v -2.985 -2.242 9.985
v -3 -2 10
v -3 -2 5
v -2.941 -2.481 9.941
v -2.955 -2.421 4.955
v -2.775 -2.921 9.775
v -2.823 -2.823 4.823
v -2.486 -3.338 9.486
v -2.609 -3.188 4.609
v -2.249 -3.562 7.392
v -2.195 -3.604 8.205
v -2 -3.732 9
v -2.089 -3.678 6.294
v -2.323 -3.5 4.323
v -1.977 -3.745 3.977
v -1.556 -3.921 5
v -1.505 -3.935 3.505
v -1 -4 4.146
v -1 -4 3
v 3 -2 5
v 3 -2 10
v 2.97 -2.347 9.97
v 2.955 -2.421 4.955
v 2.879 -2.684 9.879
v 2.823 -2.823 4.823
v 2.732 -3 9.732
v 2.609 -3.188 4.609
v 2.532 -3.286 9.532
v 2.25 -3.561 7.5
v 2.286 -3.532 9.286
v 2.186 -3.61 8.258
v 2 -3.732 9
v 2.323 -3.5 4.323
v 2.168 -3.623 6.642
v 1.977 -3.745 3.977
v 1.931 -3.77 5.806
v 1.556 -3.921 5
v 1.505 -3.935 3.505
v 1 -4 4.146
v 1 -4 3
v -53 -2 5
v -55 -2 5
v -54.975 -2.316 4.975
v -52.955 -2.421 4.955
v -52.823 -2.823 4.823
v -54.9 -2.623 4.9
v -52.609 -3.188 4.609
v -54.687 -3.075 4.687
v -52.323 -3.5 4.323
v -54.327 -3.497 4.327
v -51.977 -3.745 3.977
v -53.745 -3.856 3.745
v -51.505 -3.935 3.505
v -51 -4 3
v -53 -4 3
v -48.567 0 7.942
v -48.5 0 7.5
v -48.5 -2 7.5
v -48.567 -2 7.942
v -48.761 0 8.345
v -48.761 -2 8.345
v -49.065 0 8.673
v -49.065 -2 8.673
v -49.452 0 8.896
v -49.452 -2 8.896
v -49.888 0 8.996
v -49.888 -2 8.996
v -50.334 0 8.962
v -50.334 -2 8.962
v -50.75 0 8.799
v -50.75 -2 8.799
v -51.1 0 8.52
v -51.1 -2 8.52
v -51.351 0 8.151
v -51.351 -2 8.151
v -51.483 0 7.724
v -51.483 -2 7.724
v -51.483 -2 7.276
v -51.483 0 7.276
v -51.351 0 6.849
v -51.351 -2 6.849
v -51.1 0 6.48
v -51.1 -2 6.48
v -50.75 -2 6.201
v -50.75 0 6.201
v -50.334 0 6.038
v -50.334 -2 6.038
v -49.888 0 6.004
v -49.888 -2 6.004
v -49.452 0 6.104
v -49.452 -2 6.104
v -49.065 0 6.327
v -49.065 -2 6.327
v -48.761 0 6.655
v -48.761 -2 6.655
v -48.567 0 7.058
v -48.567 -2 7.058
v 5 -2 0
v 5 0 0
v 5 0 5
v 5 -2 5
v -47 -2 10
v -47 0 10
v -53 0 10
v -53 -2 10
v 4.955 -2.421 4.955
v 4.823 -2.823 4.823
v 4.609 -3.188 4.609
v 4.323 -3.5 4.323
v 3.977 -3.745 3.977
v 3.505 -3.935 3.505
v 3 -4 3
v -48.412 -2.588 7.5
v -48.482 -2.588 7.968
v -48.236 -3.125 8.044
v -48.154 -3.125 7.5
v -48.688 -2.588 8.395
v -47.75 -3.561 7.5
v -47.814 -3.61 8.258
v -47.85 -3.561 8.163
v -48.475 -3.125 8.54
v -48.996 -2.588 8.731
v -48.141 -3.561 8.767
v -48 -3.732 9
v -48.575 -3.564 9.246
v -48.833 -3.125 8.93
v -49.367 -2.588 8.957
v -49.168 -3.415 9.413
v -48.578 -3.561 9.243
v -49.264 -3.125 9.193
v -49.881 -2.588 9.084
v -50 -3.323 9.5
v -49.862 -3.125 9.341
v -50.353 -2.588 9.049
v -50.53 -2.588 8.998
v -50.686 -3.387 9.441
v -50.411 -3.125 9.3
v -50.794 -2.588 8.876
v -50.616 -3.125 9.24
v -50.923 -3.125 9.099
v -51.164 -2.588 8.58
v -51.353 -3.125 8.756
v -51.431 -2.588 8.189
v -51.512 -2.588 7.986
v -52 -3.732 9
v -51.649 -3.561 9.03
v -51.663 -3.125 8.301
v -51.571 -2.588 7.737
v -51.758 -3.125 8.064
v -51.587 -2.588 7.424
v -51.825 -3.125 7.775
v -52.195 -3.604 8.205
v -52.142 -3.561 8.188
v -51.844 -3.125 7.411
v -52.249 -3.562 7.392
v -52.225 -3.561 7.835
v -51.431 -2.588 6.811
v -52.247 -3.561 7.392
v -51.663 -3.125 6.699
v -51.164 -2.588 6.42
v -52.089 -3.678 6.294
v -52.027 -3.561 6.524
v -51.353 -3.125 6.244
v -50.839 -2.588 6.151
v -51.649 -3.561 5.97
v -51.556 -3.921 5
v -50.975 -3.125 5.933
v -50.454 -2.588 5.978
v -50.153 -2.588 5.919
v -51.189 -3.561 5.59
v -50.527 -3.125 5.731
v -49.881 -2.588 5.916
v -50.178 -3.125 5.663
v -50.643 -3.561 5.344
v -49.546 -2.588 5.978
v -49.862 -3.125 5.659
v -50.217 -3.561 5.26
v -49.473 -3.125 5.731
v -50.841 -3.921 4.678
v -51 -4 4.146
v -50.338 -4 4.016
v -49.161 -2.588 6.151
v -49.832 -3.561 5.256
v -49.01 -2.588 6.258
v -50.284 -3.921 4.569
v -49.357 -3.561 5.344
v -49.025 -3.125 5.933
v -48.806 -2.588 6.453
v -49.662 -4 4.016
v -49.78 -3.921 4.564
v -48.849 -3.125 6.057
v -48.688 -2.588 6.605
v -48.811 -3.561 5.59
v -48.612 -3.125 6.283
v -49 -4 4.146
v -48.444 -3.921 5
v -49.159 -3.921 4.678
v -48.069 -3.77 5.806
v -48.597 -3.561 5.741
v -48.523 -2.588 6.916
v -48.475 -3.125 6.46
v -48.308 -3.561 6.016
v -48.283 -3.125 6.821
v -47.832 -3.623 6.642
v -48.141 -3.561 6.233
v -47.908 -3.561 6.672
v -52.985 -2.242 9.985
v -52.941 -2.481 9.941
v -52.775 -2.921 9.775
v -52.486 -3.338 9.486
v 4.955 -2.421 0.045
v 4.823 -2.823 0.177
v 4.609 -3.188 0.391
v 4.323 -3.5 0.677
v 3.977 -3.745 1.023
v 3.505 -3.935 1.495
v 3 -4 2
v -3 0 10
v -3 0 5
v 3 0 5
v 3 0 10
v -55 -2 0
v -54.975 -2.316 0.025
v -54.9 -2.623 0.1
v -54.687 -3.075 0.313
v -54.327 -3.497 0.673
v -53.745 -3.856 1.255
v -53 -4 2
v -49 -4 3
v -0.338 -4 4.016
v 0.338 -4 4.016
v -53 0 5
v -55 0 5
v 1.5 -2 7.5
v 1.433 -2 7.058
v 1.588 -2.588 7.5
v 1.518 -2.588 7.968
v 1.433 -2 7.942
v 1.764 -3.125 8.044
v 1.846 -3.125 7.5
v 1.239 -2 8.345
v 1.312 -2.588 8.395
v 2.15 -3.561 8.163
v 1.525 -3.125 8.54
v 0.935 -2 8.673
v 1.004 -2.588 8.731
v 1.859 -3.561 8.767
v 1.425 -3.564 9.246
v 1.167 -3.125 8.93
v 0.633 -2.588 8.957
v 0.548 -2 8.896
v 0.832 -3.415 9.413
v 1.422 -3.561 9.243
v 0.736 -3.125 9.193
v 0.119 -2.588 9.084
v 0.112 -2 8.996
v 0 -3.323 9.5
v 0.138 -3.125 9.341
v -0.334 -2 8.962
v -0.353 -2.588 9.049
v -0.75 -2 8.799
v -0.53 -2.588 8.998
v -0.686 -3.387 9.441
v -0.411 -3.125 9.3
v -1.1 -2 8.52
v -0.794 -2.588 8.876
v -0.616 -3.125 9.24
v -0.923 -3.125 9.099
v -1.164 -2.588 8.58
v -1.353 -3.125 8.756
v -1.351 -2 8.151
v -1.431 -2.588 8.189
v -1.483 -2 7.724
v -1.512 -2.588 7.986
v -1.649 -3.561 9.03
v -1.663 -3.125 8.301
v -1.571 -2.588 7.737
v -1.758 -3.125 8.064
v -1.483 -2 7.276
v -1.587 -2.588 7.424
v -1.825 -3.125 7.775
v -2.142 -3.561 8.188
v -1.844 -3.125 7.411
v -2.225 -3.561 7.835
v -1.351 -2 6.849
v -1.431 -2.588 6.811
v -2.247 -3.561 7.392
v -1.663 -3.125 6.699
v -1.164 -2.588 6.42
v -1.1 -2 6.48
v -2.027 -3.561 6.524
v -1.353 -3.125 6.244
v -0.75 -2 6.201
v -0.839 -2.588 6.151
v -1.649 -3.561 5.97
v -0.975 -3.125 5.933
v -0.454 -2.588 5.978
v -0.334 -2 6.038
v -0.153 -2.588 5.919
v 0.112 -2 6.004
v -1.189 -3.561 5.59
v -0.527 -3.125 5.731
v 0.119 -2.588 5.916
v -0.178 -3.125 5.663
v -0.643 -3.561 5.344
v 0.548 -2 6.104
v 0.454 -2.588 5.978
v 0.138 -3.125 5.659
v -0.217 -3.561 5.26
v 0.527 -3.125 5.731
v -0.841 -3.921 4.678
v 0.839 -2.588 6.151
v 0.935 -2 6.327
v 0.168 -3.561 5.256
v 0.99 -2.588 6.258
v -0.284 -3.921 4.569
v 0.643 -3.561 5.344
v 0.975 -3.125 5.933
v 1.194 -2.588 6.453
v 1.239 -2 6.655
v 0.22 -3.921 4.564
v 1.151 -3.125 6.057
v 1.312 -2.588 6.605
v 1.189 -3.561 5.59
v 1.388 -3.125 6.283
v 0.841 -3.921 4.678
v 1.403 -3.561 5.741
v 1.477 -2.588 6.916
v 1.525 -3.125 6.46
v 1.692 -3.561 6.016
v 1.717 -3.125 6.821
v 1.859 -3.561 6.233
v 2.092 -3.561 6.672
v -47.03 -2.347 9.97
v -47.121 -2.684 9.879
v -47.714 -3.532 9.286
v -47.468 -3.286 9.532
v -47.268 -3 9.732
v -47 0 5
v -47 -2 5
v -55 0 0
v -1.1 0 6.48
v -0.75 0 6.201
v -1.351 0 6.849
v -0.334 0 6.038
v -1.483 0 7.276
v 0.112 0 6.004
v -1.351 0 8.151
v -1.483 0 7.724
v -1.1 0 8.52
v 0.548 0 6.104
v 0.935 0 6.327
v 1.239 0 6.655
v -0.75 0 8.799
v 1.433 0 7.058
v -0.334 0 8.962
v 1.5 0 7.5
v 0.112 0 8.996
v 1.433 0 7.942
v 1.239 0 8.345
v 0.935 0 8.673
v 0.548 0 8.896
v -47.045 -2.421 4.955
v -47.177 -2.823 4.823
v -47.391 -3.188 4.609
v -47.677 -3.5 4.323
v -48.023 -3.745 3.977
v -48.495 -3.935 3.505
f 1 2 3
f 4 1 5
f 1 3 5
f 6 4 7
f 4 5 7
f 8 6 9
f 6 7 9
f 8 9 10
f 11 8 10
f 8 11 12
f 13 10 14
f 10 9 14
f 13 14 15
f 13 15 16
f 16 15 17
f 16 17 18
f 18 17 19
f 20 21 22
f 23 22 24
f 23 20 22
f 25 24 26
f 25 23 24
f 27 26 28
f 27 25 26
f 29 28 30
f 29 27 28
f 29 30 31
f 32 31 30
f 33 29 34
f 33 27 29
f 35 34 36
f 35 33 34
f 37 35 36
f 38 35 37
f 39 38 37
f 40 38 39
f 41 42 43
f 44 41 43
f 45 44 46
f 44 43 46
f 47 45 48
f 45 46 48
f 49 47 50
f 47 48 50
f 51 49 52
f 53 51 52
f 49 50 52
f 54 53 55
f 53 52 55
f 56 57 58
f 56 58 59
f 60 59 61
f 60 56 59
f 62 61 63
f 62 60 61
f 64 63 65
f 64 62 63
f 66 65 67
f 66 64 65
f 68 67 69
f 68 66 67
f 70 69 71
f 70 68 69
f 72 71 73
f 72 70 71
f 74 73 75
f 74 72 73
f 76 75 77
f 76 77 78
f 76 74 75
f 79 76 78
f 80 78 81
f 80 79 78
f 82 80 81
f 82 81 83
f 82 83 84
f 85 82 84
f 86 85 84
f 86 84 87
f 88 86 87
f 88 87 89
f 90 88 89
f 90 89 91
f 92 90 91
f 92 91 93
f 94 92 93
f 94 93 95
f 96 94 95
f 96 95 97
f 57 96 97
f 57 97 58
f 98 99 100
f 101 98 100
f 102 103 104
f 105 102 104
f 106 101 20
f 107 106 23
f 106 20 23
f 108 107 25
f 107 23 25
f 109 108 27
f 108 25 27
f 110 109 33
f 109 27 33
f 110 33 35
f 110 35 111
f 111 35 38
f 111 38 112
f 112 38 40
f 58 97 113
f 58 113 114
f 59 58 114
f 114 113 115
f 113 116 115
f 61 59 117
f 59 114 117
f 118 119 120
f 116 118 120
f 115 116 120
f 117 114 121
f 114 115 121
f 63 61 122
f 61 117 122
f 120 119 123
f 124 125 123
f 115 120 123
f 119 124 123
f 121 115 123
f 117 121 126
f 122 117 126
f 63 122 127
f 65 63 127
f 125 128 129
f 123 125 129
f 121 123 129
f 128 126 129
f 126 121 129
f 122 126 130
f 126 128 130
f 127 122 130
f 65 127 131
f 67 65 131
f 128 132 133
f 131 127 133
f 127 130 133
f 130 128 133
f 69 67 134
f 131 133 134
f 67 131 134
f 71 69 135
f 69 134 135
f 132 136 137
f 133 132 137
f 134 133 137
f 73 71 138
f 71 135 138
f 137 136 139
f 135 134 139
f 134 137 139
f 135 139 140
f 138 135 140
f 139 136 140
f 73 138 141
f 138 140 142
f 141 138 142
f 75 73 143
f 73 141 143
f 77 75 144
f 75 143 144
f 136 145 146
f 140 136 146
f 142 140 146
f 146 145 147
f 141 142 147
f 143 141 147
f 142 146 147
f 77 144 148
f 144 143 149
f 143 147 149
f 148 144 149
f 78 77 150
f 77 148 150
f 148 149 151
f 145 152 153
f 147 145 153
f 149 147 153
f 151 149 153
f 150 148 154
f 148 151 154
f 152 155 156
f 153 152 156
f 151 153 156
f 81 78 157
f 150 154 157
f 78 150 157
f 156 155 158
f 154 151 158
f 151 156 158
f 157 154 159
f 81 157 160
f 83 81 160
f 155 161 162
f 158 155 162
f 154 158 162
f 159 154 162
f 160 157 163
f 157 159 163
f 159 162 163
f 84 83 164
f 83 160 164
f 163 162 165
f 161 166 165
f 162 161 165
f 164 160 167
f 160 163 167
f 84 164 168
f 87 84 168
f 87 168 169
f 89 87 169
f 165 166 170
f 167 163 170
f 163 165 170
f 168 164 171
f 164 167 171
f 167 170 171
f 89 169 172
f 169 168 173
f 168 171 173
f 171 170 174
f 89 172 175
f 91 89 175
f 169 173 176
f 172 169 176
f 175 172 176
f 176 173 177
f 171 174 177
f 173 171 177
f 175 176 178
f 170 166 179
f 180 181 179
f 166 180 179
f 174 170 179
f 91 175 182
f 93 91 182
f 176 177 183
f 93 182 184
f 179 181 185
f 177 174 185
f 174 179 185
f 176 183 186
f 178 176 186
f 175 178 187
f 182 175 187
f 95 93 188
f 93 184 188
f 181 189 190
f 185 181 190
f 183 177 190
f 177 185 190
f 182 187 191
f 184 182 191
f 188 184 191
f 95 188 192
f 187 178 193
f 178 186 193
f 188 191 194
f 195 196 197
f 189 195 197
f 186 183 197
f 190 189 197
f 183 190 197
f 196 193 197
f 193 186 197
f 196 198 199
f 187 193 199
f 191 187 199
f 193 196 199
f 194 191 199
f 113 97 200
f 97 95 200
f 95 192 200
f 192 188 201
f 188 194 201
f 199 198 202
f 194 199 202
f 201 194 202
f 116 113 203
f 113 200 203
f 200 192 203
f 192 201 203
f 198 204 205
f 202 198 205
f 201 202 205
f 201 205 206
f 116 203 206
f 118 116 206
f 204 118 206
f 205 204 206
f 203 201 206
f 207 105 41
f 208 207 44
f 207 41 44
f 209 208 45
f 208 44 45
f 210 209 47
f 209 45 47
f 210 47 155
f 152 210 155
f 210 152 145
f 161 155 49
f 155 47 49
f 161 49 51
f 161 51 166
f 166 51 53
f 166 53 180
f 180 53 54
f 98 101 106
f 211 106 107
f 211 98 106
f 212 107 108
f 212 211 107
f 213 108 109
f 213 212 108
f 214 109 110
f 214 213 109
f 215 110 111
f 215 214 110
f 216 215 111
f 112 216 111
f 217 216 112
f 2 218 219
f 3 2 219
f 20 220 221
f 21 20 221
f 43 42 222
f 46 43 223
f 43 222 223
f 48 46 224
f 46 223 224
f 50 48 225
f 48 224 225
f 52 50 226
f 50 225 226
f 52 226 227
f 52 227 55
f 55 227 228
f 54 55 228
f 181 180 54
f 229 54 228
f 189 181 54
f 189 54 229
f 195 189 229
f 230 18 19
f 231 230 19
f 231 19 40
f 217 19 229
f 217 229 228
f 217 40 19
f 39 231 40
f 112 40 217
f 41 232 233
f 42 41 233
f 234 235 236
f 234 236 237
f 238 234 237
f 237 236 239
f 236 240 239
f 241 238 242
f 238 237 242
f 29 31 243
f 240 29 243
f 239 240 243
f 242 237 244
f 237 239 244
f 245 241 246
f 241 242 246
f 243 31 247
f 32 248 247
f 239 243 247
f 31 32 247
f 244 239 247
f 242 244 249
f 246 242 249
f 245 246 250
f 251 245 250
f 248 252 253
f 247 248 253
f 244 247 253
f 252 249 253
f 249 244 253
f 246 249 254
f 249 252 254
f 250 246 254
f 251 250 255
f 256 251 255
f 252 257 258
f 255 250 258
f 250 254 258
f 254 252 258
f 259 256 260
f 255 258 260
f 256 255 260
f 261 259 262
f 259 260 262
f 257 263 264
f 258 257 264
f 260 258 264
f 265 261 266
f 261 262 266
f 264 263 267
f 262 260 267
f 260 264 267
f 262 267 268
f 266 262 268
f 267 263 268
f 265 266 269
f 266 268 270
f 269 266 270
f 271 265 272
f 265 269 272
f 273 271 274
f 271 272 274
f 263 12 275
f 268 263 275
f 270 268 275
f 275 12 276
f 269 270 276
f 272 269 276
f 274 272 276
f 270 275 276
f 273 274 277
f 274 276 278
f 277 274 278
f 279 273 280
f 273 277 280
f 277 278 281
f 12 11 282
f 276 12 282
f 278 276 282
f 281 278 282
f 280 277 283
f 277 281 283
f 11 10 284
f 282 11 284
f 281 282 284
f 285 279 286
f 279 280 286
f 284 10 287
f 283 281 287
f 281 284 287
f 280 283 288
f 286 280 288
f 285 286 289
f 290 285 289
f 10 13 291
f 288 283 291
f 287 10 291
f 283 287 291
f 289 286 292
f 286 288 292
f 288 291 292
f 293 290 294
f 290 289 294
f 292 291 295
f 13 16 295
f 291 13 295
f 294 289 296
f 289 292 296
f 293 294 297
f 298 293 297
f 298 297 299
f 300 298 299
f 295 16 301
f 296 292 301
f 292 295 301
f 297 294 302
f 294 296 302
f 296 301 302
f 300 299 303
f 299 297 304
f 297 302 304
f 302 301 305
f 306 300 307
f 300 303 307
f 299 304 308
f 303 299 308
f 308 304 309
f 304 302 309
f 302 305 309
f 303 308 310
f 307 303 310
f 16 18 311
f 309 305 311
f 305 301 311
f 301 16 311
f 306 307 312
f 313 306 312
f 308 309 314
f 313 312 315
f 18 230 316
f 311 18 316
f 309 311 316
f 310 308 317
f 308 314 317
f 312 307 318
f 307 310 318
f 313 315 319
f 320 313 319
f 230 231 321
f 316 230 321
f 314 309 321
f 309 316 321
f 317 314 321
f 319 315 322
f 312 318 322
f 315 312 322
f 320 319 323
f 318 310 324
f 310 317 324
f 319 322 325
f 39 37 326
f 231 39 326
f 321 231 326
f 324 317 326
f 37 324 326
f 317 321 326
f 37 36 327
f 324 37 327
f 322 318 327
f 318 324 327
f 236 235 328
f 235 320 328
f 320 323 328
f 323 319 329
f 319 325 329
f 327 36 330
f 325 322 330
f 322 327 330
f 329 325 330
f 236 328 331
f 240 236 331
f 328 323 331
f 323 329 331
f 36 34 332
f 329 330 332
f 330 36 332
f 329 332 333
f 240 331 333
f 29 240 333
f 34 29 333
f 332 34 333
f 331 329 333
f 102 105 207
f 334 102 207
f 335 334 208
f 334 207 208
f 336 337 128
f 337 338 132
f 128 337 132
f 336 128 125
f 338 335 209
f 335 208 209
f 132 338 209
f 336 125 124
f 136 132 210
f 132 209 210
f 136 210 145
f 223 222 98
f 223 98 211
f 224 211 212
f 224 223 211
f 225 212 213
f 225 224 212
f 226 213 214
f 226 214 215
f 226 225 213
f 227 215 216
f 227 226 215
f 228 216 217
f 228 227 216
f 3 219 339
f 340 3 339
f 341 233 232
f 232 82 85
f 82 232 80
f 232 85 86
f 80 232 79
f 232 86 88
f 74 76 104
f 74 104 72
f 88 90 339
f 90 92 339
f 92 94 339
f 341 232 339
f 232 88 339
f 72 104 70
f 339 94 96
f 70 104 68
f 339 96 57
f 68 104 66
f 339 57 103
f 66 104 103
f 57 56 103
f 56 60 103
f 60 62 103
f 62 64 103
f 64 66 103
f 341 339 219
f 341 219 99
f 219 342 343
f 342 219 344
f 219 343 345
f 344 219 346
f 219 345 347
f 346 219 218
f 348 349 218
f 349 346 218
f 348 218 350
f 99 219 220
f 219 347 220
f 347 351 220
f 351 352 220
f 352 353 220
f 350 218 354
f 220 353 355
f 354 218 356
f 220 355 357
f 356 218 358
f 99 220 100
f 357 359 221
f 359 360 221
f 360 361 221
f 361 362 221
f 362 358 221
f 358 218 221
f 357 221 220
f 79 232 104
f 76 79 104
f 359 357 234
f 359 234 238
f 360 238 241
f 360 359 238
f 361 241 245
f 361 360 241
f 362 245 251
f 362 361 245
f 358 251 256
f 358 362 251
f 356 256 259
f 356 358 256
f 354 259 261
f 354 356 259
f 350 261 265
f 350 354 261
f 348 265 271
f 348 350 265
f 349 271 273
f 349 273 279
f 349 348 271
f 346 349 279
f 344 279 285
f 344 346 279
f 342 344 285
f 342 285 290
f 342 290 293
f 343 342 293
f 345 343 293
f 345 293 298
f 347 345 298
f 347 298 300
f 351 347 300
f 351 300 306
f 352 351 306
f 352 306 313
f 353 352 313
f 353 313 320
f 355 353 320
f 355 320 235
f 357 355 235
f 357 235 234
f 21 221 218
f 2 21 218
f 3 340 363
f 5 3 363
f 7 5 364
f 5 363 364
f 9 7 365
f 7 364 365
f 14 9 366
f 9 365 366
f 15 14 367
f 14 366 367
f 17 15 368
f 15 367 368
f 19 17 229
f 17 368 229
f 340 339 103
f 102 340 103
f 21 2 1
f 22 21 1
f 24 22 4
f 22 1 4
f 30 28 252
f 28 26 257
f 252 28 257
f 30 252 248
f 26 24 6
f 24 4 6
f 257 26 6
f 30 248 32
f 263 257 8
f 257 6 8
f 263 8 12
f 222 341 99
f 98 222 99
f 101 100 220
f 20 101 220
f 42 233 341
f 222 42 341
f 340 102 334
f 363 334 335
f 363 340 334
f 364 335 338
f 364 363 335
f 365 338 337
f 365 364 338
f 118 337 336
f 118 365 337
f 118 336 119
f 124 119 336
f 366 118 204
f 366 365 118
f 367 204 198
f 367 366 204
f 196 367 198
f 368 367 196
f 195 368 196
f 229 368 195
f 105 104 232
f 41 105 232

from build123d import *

# Parameters (mm, degrees)
F0_R         = 1.5
F1_DEPTH     = 4
F2_T1_DEPTH  = 15
F2_T3_DEPTH  = 70
F2_T5_DEPTH  = 7
F2_T7_DEPTH  = 10
F2_T9_DEPTH  = 16
F2_T11_DEPTH = 44
F2_T13_DEPTH = 16
F2_T15_DEPTH = 7
F2_T25_DEPTH = 12
F2_T29_DEPTH = 15
F2_T36_DEPTH = 15
F2_T40_DEPTH = 49
F2_T47_DEPTH = 49
F2_T51_DEPTH = 15
F2_T58_DEPTH = 15
F2_T62_DEPTH = 12


# Not quite as in the source:
# - a fillet or chamfer that OpenCascade refuses, or shapes differently, is made with other operations: its cross-section is extruded or revolved along the edge and cut away or added


with BuildPart() as f1:
    # F0 (on Front) → F1 (new body)
    with BuildSketch(Plane.XZ):
        Polygon((-55, 5), (-55, 0), (5, 0), (5, 5), (3, 5), (3, 10), (-3, 10), (-3, 5), (-47, 5), (-47, 10), (-53, 10), (-53, 5), align=None)
        with Locations((-50, 7.5)):
            Circle(F0_R, mode=Mode.SUBTRACT)
        with Locations((0, 7.5)):
            Circle(F0_R, mode=Mode.SUBTRACT)
    extrude(amount=F1_DEPTH)

    # F2: fillet of radius 2 on 14 edges, made by hand

    # F2_s2 → F2_t1 (cut)
    with BuildSketch(Plane.XY.offset(-5)):
        with BuildLine():
            ThreePointArc((-55, -2), (-54.4142135624, -3.4142135624), (-53, -4))
            Line((-53, -4), (-55, -4))
            Line((-55, -4), (-55, -2))
        make_face()
        with BuildLine():
            ThreePointArc((5, -2), (4.4142135624, -3.4142135624), (3, -4))
            Line((3, -4), (5, -4))
            Line((5, -4), (5, -2))
        make_face()
    extrude(amount=F2_T1_DEPTH, mode=Mode.SUBTRACT)

    # F2_s4 → F2_t3 (cut)
    with BuildSketch(Plane.YZ.offset(-60)):
        with BuildLine():
            ThreePointArc((-2, 0), (-3.4142135624, 0.5857864376), (-4, 2))
            Line((-4, 2), (-4, 0))
            Line((-4, 0), (-2, 0))
        make_face()
    extrude(amount=F2_T3_DEPTH, mode=Mode.SUBTRACT)

    # F2_s6 → F2_t5 (cut)
    with BuildSketch(Plane.YZ.offset(3)):
        with BuildLine():
            ThreePointArc((-2, 5), (-3.4142135624, 4.4142135624), (-4, 3))
            Line((-4, 3), (-4, 5))
            Line((-4, 5), (-2, 5))
        make_face()
    extrude(amount=F2_T5_DEPTH, mode=Mode.SUBTRACT)

    # F2_s8 → F2_t7 (cut)
    with BuildSketch(Plane.XY.offset(5)):
        with BuildLine():
            ThreePointArc((3, -2), (2.4142135624, -3.4142135624), (1, -4))
            Line((1, -4), (3, -4))
            Line((3, -4), (3, -2))
        make_face()
        with BuildLine():
            ThreePointArc((-3, -2), (-2.4142135624, -3.4142135624), (-1, -4))
            Line((-1, -4), (-3, -4))
            Line((-3, -4), (-3, -2))
        make_face()
        with BuildLine():
            ThreePointArc((-47, -2), (-47.5857864376, -3.4142135624), (-49, -4))
            Line((-49, -4), (-47, -4))
            Line((-47, -4), (-47, -2))
        make_face()
        with BuildLine():
            ThreePointArc((-53, -2), (-52.4142135624, -3.4142135624), (-51, -4))
            Line((-51, -4), (-53, -4))
            Line((-53, -4), (-53, -2))
        make_face()
    extrude(amount=F2_T7_DEPTH, mode=Mode.SUBTRACT)

    # F2_s10 → F2_t9 (cut)
    with BuildSketch(Plane.YZ.offset(-8)):
        with BuildLine():
            ThreePointArc((-2, 10), (-3.4142135624, 9.4142135624), (-4, 8))
            Line((-4, 8), (-4, 10))
            Line((-4, 10), (-2, 10))
        make_face()
    extrude(amount=F2_T9_DEPTH, mode=Mode.SUBTRACT)

    # F2_s12 → F2_t11 (cut)
    with BuildSketch(Plane.YZ.offset(-47)):
        with BuildLine():
            ThreePointArc((-2, 5), (-3.4142135624, 4.4142135624), (-4, 3))
            Line((-4, 3), (-4, 5))
            Line((-4, 5), (-2, 5))
        make_face()
    extrude(amount=F2_T11_DEPTH, mode=Mode.SUBTRACT)

    # F2_s14 → F2_t13 (cut)
    with BuildSketch(Plane.YZ.offset(-58)):
        with BuildLine():
            ThreePointArc((-2, 10), (-3.4142135624, 9.4142135624), (-4, 8))
            Line((-4, 8), (-4, 10))
            Line((-4, 10), (-2, 10))
        make_face()
    extrude(amount=F2_T13_DEPTH, mode=Mode.SUBTRACT)

    # F2_s16 → F2_t15 (cut)
    with BuildSketch(Plane.YZ.offset(-60)):
        with BuildLine():
            ThreePointArc((-2, 5), (-3.4142135624, 4.4142135624), (-4, 3))
            Line((-4, 3), (-4, 5))
            Line((-4, 5), (-2, 5))
        make_face()
    extrude(amount=F2_T15_DEPTH, mode=Mode.SUBTRACT)

    # F2_s17 → F2_t18 (revolve, cut)
    with BuildSketch(Plane.XY.offset(7.5)):
        with BuildLine():
            ThreePointArc((-48.5, -2), (-47.9142135624, -3.4142135624), (-46.5, -4))
            Line((-46.5, -4), (-48.5, -4))
            Line((-48.5, -4), (-48.5, -2))
        make_face()
    revolve(axis=Axis((-50, -4, 7.5), (0, -1, 0)), mode=Mode.SUBTRACT)

    # F2_s19 → F2_t20 (revolve, cut)
    with BuildSketch(Plane.XY.offset(7.5)):
        with BuildLine():
            ThreePointArc((1.5, -2), (2.0857864376, -3.4142135624), (3.5, -4))
            Line((3.5, -4), (1.5, -4))
            Line((1.5, -4), (1.5, -2))
        make_face()
    revolve(axis=Axis((0, -4, 7.5), (0, -1, 0)), mode=Mode.SUBTRACT)


with BuildPart() as f2_tool23:
    # F2_s24 → F2_t25 (new body)
    with BuildSketch(Plane.YZ.offset(10)):
        with BuildLine():
            ThreePointArc((-2, 5), (-3.4142135624, 4.4142135624), (-4, 3))
            Line((-4, 3), (-4, 5))
            Line((-4, 5), (-2, 5))
        make_face()
    extrude(amount=-F2_T25_DEPTH)

    split(bisect_by=Plane.YZ.offset(3), keep=Keep.BOTTOM)


with BuildPart() as f2_tool27:
    # F2_s28 → F2_t29 (new body)
    with BuildSketch(Plane.XY):
        with BuildLine():
            ThreePointArc((3, -2), (2.4142135624, -3.4142135624), (1, -4))
            Line((1, -4), (3, -4))
            Line((3, -4), (3, -2))
        make_face()
    extrude(amount=F2_T29_DEPTH)

    split(bisect_by=Plane.XY.offset(5), keep=Keep.BOTTOM)


with BuildPart() as f2_tool23_1:
    add(f2_tool23.part)

    # F2_t31: intersect F2_tool27
    add(f2_tool27.part, mode=Mode.INTERSECT)


with BuildPart() as f1_1:
    add(f1.part)

    # F2_t21: cut F2_tool23
    add(f2_tool23_1.part, mode=Mode.SUBTRACT)


with BuildPart() as f2_tool34:
    # F2_s35 → F2_t36 (new body)
    with BuildSketch(Plane.XY.offset(15)):
        with BuildLine():
            ThreePointArc((-3, -2), (-2.4142135624, -3.4142135624), (-1, -4))
            Line((-1, -4), (-3, -4))
            Line((-3, -4), (-3, -2))
        make_face()
    extrude(amount=-F2_T36_DEPTH)

    split(bisect_by=Plane.XY.offset(5), keep=Keep.BOTTOM)


with BuildPart() as f2_tool38:
    # F2_s39 → F2_t40 (new body)
    with BuildSketch(Plane.YZ.offset(2)):
        with BuildLine():
            ThreePointArc((-2, 5), (-3.4142135624, 4.4142135624), (-4, 3))
            Line((-4, 3), (-4, 5))
            Line((-4, 5), (-2, 5))
        make_face()
    extrude(amount=-F2_T40_DEPTH)

    split(bisect_by=Plane.YZ.offset(-3), keep=Keep.TOP)


with BuildPart() as f2_tool34_1:
    add(f2_tool34.part)

    # F2_t42: intersect F2_tool38
    add(f2_tool38.part, mode=Mode.INTERSECT)


with BuildPart() as f1_2:
    add(f1_1.part)

    # F2_t32: cut F2_tool34
    add(f2_tool34_1.part, mode=Mode.SUBTRACT)


with BuildPart() as f2_tool45:
    # F2_s46 → F2_t47 (new body)
    with BuildSketch(Plane.YZ.offset(-3)):
        with BuildLine():
            ThreePointArc((-2, 5), (-3.4142135624, 4.4142135624), (-4, 3))
            Line((-4, 3), (-4, 5))
            Line((-4, 5), (-2, 5))
        make_face()
    extrude(amount=-F2_T47_DEPTH)

    split(bisect_by=Plane.YZ.offset(-47), keep=Keep.BOTTOM)


with BuildPart() as f2_tool49:
    # F2_s50 → F2_t51 (new body)
    with BuildSketch(Plane.XY):
        with BuildLine():
            ThreePointArc((-47, -2), (-47.5857864376, -3.4142135624), (-49, -4))
            Line((-49, -4), (-47, -4))
            Line((-47, -4), (-47, -2))
        make_face()
    extrude(amount=F2_T51_DEPTH)

    split(bisect_by=Plane.XY.offset(5), keep=Keep.BOTTOM)


with BuildPart() as f2_tool45_1:
    add(f2_tool45.part)

    # F2_t53: intersect F2_tool49
    add(f2_tool49.part, mode=Mode.INTERSECT)


with BuildPart() as f1_3:
    add(f1_2.part)

    # F2_t43: cut F2_tool45
    add(f2_tool45_1.part, mode=Mode.SUBTRACT)


with BuildPart() as f2_tool56:
    # F2_s57 → F2_t58 (new body)
    with BuildSketch(Plane.XY.offset(15)):
        with BuildLine():
            ThreePointArc((-53, -2), (-52.4142135624, -3.4142135624), (-51, -4))
            Line((-51, -4), (-53, -4))
            Line((-53, -4), (-53, -2))
        make_face()
    extrude(amount=-F2_T58_DEPTH)

    split(bisect_by=Plane.XY.offset(5), keep=Keep.BOTTOM)


with BuildPart() as f2_tool60:
    # F2_s61 → F2_t62 (new body)
    with BuildSketch(Plane.YZ.offset(-48)):
        with BuildLine():
            ThreePointArc((-2, 5), (-3.4142135624, 4.4142135624), (-4, 3))
            Line((-4, 3), (-4, 5))
            Line((-4, 5), (-2, 5))
        make_face()
    extrude(amount=-F2_T62_DEPTH)

    split(bisect_by=Plane.YZ.offset(-53), keep=Keep.TOP)


with BuildPart() as f2_tool56_1:
    add(f2_tool56.part)

    # F2_t64: intersect F2_tool60
    add(f2_tool60.part, mode=Mode.INTERSECT)


with BuildPart() as f1_4:
    add(f1_3.part)

    # F2_t54: cut F2_tool56
    add(f2_tool56_1.part, mode=Mode.SUBTRACT)


solid = f1_4.part
